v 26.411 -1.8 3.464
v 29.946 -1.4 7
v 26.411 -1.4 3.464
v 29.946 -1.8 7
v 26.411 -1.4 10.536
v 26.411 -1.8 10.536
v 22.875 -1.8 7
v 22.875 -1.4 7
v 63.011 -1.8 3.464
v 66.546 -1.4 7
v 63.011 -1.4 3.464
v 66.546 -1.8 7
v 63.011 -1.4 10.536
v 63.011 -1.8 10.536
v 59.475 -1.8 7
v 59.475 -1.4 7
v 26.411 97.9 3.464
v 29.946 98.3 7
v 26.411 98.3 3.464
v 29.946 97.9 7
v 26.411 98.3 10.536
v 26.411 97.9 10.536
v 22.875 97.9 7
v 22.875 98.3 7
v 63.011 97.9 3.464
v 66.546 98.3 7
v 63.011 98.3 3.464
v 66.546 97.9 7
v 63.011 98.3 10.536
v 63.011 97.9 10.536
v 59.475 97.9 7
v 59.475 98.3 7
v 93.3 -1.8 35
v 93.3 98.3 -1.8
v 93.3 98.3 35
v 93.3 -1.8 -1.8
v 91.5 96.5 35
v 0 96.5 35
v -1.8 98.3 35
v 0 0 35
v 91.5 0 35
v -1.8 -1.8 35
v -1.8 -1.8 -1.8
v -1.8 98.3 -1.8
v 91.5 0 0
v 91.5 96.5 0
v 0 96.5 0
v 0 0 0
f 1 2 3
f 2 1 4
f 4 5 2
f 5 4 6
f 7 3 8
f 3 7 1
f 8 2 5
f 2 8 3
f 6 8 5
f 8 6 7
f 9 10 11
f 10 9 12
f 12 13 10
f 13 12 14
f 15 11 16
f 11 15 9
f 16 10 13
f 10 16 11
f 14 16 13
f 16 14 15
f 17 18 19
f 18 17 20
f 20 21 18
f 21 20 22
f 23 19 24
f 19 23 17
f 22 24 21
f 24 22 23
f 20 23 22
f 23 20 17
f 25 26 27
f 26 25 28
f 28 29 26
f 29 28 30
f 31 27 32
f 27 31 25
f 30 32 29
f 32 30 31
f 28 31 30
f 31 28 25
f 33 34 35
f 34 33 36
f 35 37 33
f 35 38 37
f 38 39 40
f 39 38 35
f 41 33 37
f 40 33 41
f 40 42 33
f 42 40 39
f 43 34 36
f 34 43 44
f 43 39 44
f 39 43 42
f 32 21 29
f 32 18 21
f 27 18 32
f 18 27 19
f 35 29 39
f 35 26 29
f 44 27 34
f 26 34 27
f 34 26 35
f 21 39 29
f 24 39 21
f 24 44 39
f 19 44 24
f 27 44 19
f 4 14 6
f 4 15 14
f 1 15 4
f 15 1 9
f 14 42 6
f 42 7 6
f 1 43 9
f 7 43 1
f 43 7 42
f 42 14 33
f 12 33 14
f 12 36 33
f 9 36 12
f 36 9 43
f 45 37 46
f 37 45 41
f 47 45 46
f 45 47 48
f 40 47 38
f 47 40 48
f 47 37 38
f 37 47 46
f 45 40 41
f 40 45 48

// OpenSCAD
/**
Carrier box for a small iHome speaker so I can throw it in a bag and not worry

- costmo
- 2018-02-19
**/

$fa = 4; // minimum angle -- use for final rendering
$fs = 0.5; // minumum size -- use for final rendering

wallThickness = 1.8;

baseWidth = 91.5;
baseLength = baseWidth + 5; // make one side a little wider so the cord can be stowed somehere
baseHeight = 35;

markerSize = 5;

base();
// lid();

// mark the long edges so the lid and base can be more easily matched visually + you know where to put the cord
module markers()
{

    translate( [(baseWidth / 4), ((-1 * wallThickness) - (markerSize - 0.4)), (baseHeight / 5)] )
    {
        markerCube();
    }

    translate( [(baseWidth / 4) * 2.6, ((-1 * wallThickness) - (markerSize - 0.4)), (baseHeight / 5)] )
    {
        markerCube();
    }

    translate( [(baseWidth / 4), (baseLength + wallThickness - 0.4), (baseHeight / 5)] )
    {
        markerCube();
    }

    translate( [(baseWidth / 4) * 2.6, (baseLength + wallThickness - 0.4), (baseHeight / 5)] )
    {
        markerCube();
    }
}

// eliminate some redundancy
module markerCube()
{
    rotate( a = 45, v = [0, 1, 0] )
    {
        cube( [markerSize, markerSize, markerSize] );
    }
}

// "BASE" is the smaller piece
module base()
{
    difference()
    {
        {
            // the solid piece around the main cutout
            translate( [(-1 * wallThickness), (-1 * wallThickness), (-1 * wallThickness)] )
            {
                cube( [(baseWidth + (wallThickness * 2)), (baseLength + (wallThickness * 2)), (baseHeight + wallThickness)] );
            }
        }
        {
            // the main cutout. this should match the dimensions of the speaker
            cube( [baseWidth, baseLength, (baseHeight + 0.1)] );
        }
        {
            markers();
        }
    }
}

module lid()
{
    lidHeight = 26;
    //lidHeight = 10;
    scaleFactor = 1.048;

    difference()
    {
        {
            scale( [scaleFactor, scaleFactor, scaleFactor] )
            {
                base();
            }
        }
        {
            translate( [-200, -200, lidHeight] )
            {
                cube( [400, 400, 100] );
            }
        }
    }
}
